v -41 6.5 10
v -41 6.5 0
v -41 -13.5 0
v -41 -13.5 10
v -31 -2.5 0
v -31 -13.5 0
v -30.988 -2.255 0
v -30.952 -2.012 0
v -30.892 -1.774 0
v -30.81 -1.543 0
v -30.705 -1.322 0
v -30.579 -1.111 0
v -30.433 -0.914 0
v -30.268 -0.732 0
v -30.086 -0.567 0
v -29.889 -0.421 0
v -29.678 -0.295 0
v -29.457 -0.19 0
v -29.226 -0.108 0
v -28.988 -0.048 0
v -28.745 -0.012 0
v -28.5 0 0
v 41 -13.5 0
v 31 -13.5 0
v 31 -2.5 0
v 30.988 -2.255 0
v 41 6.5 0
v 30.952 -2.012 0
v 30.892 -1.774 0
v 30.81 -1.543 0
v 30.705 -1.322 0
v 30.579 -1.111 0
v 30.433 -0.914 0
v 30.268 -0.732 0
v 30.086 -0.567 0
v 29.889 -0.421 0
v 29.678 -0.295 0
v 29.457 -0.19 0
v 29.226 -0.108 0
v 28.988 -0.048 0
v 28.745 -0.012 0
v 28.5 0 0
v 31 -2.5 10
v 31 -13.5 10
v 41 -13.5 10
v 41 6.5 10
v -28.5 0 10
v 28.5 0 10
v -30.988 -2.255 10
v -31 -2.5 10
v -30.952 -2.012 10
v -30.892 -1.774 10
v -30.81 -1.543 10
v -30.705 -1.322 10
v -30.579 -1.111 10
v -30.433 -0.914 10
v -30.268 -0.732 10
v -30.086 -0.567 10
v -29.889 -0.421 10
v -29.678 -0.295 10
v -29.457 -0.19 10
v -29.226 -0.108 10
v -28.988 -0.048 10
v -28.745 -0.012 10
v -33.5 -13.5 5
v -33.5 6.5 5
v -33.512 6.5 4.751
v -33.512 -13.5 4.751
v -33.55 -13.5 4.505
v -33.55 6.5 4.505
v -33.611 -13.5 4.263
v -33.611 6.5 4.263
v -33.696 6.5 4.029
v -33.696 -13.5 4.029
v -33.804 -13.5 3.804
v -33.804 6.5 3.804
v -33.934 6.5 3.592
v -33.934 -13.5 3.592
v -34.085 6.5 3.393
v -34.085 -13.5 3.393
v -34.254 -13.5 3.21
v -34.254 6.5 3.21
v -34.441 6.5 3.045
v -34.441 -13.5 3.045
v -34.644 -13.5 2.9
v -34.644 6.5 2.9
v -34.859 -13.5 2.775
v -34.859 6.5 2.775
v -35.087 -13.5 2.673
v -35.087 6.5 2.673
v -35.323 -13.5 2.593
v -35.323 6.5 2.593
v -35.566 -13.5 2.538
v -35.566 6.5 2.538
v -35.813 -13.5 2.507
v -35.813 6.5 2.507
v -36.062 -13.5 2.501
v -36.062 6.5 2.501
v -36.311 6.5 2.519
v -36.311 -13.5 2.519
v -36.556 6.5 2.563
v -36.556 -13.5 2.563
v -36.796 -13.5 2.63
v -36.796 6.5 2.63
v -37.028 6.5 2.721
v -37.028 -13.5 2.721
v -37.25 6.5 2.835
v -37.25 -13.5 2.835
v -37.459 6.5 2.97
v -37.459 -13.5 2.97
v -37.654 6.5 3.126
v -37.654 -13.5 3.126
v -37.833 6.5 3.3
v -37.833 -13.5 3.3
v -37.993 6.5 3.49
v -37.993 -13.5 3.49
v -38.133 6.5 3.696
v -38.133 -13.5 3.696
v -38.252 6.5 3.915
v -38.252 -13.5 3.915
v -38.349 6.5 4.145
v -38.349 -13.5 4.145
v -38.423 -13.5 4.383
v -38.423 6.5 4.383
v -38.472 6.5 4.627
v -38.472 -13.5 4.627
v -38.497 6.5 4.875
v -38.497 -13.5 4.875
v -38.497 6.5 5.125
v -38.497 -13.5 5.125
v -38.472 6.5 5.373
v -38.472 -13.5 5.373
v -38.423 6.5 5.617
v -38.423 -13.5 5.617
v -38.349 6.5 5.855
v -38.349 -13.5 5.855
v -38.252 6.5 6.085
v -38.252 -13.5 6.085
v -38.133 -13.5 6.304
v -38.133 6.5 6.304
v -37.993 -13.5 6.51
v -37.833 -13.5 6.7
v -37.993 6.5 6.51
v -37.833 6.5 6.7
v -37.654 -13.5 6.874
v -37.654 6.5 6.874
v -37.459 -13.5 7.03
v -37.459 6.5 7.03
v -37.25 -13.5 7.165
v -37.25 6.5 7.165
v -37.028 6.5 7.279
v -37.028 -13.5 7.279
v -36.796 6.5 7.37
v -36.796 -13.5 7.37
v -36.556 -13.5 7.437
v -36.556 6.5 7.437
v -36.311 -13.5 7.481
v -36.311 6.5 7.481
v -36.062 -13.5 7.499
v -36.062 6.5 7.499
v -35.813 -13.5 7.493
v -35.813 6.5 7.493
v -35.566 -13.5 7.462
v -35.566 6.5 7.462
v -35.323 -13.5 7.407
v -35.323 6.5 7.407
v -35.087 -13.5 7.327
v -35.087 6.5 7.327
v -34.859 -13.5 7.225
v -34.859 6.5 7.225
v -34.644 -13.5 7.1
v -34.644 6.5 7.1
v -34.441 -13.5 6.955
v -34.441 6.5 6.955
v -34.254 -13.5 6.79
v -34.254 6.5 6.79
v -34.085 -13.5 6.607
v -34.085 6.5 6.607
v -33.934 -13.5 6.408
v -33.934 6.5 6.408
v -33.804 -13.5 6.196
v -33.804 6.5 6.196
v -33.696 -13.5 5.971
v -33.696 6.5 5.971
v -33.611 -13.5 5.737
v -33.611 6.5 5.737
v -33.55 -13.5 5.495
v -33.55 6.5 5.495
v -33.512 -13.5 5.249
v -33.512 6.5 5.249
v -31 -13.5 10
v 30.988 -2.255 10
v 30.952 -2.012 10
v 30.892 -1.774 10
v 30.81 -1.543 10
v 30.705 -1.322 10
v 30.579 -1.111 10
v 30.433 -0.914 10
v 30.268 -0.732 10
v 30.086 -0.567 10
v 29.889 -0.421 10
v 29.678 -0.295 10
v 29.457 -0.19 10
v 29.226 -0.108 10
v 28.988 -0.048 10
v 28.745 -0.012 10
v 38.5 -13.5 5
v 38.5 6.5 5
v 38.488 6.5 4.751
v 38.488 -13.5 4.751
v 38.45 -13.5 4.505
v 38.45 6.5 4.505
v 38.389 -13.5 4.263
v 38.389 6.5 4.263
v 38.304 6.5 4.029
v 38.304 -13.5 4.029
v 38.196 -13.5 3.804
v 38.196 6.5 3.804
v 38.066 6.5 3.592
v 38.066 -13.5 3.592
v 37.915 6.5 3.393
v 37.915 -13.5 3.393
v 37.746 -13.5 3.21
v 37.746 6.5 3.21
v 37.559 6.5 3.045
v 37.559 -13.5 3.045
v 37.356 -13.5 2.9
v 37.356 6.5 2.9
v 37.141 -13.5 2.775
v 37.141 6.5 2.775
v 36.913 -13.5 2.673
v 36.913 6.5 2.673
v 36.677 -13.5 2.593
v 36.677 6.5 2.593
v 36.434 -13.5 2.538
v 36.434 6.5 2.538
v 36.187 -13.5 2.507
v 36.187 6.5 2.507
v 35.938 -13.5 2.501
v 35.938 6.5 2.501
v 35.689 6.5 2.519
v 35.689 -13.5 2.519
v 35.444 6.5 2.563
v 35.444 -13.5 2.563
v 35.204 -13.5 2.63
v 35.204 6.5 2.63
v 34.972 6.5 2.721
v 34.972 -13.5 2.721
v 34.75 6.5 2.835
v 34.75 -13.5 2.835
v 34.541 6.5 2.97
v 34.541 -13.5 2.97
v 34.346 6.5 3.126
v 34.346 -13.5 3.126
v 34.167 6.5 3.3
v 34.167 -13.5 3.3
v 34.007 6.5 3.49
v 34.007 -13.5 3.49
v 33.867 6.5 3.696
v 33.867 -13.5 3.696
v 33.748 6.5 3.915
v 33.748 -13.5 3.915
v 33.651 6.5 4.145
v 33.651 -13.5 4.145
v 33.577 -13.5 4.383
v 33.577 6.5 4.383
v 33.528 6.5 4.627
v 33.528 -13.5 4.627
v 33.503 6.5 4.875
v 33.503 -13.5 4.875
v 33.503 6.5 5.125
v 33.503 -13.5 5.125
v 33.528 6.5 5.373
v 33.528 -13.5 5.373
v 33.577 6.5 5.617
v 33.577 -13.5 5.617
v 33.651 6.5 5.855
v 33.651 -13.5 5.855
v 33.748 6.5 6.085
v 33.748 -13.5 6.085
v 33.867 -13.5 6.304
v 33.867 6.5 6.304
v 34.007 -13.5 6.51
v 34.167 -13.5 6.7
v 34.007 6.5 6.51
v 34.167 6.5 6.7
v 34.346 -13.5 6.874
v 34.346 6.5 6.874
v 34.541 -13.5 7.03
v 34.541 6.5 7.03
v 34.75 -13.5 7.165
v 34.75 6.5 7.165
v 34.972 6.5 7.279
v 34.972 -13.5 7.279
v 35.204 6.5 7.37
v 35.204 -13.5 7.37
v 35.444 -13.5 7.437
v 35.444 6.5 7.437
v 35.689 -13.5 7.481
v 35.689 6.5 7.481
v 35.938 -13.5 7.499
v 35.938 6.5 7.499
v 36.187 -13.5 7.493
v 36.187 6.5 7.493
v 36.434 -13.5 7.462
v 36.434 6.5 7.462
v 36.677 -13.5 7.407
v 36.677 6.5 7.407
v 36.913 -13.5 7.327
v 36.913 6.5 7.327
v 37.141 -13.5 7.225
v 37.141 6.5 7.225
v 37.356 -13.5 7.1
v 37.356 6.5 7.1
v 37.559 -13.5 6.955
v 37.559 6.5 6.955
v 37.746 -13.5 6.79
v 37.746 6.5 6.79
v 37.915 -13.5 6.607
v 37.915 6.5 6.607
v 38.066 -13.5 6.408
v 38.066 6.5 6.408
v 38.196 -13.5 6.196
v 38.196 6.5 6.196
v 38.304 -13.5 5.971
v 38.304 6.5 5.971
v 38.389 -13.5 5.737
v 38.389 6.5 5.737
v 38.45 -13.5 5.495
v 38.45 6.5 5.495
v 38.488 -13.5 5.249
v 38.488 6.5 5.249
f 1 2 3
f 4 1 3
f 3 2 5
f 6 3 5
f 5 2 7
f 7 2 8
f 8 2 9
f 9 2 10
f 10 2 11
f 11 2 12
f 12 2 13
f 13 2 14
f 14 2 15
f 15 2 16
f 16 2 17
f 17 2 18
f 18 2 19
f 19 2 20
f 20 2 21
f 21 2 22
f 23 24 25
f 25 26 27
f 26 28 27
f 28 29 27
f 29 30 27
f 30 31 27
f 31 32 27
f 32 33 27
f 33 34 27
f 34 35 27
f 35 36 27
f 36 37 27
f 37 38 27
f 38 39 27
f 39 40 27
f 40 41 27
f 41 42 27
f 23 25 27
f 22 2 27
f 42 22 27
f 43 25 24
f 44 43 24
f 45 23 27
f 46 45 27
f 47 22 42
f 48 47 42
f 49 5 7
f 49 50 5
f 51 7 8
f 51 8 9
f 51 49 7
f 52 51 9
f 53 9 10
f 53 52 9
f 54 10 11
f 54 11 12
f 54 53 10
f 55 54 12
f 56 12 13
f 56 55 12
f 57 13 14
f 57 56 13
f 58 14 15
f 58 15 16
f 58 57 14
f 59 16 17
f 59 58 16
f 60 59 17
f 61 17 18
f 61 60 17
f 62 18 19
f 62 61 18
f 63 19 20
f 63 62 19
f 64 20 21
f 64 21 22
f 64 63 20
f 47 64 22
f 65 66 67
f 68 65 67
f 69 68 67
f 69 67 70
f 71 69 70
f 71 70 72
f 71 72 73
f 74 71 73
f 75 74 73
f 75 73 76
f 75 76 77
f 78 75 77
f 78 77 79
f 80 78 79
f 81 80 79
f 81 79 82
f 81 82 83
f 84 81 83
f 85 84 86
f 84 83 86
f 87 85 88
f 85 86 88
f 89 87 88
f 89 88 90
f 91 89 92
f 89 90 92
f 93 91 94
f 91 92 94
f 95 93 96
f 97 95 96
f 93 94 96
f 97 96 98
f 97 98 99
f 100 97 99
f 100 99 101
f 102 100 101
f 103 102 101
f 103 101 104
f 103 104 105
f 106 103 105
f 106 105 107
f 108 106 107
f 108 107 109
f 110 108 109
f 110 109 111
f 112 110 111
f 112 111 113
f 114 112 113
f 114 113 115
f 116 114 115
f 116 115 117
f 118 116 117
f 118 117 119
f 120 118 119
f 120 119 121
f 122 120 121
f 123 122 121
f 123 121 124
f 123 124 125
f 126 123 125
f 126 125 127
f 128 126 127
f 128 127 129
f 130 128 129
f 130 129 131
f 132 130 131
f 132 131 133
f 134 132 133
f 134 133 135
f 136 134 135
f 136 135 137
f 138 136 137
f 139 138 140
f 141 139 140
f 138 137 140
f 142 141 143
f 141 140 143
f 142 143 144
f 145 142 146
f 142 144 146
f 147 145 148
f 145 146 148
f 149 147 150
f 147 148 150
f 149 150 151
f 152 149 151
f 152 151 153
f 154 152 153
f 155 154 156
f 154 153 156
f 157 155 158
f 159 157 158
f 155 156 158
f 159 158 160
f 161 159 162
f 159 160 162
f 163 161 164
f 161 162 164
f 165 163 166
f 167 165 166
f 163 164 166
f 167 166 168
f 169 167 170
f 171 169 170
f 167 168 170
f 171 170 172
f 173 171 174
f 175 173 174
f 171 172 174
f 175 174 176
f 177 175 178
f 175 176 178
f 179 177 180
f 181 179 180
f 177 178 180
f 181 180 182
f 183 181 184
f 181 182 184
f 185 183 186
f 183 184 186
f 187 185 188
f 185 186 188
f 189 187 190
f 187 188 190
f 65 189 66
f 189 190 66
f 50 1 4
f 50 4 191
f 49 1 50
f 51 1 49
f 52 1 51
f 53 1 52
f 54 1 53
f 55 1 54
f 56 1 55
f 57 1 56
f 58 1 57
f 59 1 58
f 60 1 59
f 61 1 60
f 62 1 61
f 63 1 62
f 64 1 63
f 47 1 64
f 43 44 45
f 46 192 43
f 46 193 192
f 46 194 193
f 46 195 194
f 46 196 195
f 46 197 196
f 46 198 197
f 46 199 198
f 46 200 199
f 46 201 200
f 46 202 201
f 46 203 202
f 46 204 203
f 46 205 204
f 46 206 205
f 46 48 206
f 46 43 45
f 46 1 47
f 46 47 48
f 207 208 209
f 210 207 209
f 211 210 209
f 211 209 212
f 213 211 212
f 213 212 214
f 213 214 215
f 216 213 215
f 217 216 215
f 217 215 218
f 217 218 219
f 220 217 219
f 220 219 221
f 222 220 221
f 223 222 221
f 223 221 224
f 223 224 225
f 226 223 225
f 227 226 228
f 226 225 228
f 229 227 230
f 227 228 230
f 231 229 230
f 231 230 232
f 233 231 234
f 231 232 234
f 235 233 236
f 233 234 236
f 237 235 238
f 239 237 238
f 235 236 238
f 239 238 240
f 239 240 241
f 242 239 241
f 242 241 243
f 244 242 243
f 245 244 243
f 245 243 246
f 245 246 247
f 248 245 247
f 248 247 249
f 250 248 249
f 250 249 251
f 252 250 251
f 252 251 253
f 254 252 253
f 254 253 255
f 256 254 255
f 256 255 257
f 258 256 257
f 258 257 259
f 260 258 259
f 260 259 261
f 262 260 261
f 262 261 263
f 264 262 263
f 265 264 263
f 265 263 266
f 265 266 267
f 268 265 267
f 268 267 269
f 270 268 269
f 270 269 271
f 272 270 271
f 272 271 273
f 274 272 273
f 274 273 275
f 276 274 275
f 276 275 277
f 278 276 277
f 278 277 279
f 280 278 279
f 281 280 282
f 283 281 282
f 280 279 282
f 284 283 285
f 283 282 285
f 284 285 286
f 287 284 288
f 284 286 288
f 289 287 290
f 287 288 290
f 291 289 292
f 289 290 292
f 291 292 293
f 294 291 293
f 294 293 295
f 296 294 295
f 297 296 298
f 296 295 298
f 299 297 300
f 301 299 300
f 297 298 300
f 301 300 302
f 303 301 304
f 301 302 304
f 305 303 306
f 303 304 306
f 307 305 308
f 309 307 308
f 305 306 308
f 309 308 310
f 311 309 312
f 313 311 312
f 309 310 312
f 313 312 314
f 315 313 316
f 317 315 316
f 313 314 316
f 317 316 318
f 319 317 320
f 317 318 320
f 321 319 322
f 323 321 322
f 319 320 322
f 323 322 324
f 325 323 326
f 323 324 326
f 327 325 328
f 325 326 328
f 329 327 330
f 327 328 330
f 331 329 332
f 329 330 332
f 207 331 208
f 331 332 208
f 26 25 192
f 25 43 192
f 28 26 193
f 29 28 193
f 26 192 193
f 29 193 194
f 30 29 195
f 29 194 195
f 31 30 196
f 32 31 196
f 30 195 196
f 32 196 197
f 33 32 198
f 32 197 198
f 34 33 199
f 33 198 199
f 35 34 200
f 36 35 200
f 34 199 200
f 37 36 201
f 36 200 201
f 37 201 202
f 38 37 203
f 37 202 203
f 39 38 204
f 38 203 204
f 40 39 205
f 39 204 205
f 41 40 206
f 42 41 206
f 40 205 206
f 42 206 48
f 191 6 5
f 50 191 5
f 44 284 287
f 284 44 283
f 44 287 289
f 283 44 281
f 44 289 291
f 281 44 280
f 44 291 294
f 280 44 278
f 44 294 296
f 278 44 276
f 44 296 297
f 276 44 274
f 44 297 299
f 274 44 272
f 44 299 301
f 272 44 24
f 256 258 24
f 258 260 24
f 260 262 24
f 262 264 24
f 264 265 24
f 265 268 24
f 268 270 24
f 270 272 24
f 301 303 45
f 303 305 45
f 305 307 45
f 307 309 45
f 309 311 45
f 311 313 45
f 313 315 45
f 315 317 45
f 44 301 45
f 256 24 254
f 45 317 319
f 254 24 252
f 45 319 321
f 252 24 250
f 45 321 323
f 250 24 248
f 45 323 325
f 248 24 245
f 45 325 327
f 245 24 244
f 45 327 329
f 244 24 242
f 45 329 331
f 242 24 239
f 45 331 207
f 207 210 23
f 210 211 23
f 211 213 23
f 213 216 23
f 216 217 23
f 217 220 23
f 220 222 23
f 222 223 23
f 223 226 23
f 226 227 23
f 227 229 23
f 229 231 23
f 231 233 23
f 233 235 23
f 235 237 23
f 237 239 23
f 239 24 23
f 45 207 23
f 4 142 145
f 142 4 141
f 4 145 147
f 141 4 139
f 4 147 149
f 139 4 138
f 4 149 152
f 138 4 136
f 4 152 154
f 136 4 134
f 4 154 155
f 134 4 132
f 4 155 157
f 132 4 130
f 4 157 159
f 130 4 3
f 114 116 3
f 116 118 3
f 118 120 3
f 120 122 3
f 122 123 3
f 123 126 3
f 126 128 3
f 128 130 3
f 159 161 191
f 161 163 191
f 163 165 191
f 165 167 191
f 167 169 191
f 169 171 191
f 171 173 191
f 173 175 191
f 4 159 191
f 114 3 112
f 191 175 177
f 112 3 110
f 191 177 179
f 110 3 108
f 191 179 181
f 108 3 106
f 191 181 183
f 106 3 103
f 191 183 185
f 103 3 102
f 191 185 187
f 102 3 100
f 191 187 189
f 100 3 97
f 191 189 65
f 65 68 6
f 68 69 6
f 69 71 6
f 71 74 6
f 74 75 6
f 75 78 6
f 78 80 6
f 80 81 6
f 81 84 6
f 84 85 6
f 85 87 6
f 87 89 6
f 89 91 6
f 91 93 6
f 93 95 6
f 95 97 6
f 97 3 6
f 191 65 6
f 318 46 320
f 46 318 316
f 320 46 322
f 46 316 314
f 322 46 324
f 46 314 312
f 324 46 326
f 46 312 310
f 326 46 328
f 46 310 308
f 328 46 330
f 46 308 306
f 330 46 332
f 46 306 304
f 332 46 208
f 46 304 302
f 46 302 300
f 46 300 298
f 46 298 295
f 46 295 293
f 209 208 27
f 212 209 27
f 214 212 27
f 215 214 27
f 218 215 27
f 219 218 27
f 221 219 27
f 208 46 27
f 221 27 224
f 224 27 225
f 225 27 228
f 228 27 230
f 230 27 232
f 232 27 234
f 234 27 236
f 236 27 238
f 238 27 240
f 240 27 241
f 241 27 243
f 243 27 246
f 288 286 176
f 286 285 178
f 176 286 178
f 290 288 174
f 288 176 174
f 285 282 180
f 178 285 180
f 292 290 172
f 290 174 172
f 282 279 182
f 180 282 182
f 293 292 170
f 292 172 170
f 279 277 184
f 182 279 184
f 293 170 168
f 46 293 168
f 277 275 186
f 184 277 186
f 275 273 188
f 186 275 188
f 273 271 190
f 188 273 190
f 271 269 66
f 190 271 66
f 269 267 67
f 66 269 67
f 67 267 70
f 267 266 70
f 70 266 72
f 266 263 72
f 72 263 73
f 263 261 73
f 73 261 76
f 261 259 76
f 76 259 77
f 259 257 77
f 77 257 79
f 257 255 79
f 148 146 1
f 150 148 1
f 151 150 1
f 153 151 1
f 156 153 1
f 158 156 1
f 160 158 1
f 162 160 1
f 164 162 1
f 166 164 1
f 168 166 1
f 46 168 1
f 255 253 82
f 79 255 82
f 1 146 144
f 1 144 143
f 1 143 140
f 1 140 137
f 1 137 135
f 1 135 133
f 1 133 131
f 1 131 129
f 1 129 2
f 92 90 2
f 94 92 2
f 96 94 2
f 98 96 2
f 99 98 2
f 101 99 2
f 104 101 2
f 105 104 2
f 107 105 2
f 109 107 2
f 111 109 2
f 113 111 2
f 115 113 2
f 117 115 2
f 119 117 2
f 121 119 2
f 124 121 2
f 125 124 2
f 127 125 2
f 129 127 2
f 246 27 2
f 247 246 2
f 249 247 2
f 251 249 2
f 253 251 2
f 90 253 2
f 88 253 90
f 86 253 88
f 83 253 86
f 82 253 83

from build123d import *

# Parameters (mm, degrees)
BOSS_EXTRUDE1_DEPTH = 10
FILLET1_R           = 2.5
CUT_EXTRUDE1_REACH  = 22
SKETCH2_R           = 2.5


with BuildPart() as part:
    # Sketch1 → Boss-Extrude1 (new body)
    with BuildSketch(Plane.XY):
        Polygon((0, 6.5), (0, 0), (31, 0), (31, -13.5), (41, -13.5), (41, 6.5), align=None)
        Polygon((-31, 0), (0, 0), (0, 6.5), (-41, 6.5), (-41, -13.5), (-31, -13.5), align=None)
    extrude(amount=BOSS_EXTRUDE1_DEPTH)

    # Fillet1
    fillet1_edges = [part.edges().sort_by_distance(p)[0] for p in [
        (31, 0, 5),
        (-31, 0, 5),
    ]]
    fillet(fillet1_edges, radius=FILLET1_R)

    # Sketch2 → Cut-Extrude1 (cut, up to next)
    with BuildSketch(Plane(origin=(0, 6.5, 0), x_dir=(1, 0, 0), z_dir=(0, 1, 0)), mode=Mode.PRIVATE) as cut_extrude1_sk1:
        with Locations((-36, -5)):
            Circle(SKETCH2_R)
    cut_extrude1_tool1 = extrude(cut_extrude1_sk1.sketch, amount=-CUT_EXTRUDE1_REACH, mode=Mode.PRIVATE) & part.part
    add(cut_extrude1_tool1.solids().sort_by_distance((-36, 6.5, 5))[0], mode=Mode.SUBTRACT)
    # Sketch2 → Cut-Extrude1 (cut, up to next)
    with BuildSketch(Plane(origin=(0, 6.5, 0), x_dir=(1, 0, 0), z_dir=(0, 1, 0)), mode=Mode.PRIVATE) as cut_extrude1_sk2:
        with Locations((36, -5)):
            Circle(SKETCH2_R)
    cut_extrude1_tool2 = extrude(cut_extrude1_sk2.sketch, amount=-CUT_EXTRUDE1_REACH, mode=Mode.PRIVATE) & part.part
    add(cut_extrude1_tool2.solids().sort_by_distance((36, 6.5, 5))[0], mode=Mode.SUBTRACT)


solid = part.part
